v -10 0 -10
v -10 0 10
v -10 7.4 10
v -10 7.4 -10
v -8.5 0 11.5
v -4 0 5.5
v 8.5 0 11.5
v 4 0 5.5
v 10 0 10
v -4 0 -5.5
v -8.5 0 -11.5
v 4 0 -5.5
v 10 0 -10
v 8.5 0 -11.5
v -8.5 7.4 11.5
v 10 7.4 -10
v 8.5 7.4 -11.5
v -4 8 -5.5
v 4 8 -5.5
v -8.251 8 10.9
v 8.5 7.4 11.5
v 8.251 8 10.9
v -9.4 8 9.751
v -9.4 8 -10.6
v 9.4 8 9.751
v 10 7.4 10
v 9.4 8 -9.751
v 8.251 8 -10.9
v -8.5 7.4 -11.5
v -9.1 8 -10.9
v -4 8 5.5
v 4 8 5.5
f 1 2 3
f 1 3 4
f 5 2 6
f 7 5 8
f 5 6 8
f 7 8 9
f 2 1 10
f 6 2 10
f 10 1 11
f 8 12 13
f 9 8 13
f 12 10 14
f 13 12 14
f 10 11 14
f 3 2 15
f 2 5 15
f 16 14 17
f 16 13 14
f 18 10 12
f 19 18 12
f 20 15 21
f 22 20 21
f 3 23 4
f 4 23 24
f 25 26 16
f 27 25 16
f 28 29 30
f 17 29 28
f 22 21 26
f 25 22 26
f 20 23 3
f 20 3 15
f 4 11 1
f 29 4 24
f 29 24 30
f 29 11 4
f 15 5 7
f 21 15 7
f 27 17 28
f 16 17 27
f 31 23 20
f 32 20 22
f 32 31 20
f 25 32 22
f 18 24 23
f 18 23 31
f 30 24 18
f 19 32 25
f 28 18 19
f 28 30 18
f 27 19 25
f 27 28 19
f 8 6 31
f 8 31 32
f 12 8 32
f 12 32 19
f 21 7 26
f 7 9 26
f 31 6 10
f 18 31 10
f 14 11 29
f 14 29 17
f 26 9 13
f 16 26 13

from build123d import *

# Parameters (mm, degrees)
SKETCH1_W           = 20
SKETCH1_H           = 23
SKETCH1_W_2         = 8
SKETCH1_H_2         = 11
BOSS_EXTRUDE1_DEPTH = 8
CHAMFER1_SIZE       = 1.5
CHAMFER2_SIZE       = 0.6


with BuildPart() as part:
    # Sketch1 → Boss-Extrude1 (new body)
    with BuildSketch(Plane(origin=(0, 0, 0), x_dir=(1, 0, 0), z_dir=(0, 1, 0))):
        Rectangle(SKETCH1_W, SKETCH1_H)
        Rectangle(SKETCH1_W_2, SKETCH1_H_2, mode=Mode.SUBTRACT)
    extrude(amount=BOSS_EXTRUDE1_DEPTH)

    # Chamfer1
    chamfer1_edges = [part.edges().sort_by_distance(p)[0] for p in [
        (-10, 4, -11.5),
        (10, 4, -11.5),
        (10, 4, 11.5),
        (-10, 4, 11.5),
    ]]
    chamfer(chamfer1_edges, length=CHAMFER1_SIZE)

    # Chamfer2
    chamfer2_edges = [part.edges().sort_by_distance(p)[0] for p in [
        (10, 8, 0),
        (0, 8, 11.5),
        (-10, 8, 0),
        (0, 8, -11.5),
        (-9.25, 8, 10.75),
        (9.25, 8, -10.75),
        (9.25, 8, 10.75),
    ]]
    chamfer(chamfer2_edges, length=CHAMFER2_SIZE)


solid = part.part
